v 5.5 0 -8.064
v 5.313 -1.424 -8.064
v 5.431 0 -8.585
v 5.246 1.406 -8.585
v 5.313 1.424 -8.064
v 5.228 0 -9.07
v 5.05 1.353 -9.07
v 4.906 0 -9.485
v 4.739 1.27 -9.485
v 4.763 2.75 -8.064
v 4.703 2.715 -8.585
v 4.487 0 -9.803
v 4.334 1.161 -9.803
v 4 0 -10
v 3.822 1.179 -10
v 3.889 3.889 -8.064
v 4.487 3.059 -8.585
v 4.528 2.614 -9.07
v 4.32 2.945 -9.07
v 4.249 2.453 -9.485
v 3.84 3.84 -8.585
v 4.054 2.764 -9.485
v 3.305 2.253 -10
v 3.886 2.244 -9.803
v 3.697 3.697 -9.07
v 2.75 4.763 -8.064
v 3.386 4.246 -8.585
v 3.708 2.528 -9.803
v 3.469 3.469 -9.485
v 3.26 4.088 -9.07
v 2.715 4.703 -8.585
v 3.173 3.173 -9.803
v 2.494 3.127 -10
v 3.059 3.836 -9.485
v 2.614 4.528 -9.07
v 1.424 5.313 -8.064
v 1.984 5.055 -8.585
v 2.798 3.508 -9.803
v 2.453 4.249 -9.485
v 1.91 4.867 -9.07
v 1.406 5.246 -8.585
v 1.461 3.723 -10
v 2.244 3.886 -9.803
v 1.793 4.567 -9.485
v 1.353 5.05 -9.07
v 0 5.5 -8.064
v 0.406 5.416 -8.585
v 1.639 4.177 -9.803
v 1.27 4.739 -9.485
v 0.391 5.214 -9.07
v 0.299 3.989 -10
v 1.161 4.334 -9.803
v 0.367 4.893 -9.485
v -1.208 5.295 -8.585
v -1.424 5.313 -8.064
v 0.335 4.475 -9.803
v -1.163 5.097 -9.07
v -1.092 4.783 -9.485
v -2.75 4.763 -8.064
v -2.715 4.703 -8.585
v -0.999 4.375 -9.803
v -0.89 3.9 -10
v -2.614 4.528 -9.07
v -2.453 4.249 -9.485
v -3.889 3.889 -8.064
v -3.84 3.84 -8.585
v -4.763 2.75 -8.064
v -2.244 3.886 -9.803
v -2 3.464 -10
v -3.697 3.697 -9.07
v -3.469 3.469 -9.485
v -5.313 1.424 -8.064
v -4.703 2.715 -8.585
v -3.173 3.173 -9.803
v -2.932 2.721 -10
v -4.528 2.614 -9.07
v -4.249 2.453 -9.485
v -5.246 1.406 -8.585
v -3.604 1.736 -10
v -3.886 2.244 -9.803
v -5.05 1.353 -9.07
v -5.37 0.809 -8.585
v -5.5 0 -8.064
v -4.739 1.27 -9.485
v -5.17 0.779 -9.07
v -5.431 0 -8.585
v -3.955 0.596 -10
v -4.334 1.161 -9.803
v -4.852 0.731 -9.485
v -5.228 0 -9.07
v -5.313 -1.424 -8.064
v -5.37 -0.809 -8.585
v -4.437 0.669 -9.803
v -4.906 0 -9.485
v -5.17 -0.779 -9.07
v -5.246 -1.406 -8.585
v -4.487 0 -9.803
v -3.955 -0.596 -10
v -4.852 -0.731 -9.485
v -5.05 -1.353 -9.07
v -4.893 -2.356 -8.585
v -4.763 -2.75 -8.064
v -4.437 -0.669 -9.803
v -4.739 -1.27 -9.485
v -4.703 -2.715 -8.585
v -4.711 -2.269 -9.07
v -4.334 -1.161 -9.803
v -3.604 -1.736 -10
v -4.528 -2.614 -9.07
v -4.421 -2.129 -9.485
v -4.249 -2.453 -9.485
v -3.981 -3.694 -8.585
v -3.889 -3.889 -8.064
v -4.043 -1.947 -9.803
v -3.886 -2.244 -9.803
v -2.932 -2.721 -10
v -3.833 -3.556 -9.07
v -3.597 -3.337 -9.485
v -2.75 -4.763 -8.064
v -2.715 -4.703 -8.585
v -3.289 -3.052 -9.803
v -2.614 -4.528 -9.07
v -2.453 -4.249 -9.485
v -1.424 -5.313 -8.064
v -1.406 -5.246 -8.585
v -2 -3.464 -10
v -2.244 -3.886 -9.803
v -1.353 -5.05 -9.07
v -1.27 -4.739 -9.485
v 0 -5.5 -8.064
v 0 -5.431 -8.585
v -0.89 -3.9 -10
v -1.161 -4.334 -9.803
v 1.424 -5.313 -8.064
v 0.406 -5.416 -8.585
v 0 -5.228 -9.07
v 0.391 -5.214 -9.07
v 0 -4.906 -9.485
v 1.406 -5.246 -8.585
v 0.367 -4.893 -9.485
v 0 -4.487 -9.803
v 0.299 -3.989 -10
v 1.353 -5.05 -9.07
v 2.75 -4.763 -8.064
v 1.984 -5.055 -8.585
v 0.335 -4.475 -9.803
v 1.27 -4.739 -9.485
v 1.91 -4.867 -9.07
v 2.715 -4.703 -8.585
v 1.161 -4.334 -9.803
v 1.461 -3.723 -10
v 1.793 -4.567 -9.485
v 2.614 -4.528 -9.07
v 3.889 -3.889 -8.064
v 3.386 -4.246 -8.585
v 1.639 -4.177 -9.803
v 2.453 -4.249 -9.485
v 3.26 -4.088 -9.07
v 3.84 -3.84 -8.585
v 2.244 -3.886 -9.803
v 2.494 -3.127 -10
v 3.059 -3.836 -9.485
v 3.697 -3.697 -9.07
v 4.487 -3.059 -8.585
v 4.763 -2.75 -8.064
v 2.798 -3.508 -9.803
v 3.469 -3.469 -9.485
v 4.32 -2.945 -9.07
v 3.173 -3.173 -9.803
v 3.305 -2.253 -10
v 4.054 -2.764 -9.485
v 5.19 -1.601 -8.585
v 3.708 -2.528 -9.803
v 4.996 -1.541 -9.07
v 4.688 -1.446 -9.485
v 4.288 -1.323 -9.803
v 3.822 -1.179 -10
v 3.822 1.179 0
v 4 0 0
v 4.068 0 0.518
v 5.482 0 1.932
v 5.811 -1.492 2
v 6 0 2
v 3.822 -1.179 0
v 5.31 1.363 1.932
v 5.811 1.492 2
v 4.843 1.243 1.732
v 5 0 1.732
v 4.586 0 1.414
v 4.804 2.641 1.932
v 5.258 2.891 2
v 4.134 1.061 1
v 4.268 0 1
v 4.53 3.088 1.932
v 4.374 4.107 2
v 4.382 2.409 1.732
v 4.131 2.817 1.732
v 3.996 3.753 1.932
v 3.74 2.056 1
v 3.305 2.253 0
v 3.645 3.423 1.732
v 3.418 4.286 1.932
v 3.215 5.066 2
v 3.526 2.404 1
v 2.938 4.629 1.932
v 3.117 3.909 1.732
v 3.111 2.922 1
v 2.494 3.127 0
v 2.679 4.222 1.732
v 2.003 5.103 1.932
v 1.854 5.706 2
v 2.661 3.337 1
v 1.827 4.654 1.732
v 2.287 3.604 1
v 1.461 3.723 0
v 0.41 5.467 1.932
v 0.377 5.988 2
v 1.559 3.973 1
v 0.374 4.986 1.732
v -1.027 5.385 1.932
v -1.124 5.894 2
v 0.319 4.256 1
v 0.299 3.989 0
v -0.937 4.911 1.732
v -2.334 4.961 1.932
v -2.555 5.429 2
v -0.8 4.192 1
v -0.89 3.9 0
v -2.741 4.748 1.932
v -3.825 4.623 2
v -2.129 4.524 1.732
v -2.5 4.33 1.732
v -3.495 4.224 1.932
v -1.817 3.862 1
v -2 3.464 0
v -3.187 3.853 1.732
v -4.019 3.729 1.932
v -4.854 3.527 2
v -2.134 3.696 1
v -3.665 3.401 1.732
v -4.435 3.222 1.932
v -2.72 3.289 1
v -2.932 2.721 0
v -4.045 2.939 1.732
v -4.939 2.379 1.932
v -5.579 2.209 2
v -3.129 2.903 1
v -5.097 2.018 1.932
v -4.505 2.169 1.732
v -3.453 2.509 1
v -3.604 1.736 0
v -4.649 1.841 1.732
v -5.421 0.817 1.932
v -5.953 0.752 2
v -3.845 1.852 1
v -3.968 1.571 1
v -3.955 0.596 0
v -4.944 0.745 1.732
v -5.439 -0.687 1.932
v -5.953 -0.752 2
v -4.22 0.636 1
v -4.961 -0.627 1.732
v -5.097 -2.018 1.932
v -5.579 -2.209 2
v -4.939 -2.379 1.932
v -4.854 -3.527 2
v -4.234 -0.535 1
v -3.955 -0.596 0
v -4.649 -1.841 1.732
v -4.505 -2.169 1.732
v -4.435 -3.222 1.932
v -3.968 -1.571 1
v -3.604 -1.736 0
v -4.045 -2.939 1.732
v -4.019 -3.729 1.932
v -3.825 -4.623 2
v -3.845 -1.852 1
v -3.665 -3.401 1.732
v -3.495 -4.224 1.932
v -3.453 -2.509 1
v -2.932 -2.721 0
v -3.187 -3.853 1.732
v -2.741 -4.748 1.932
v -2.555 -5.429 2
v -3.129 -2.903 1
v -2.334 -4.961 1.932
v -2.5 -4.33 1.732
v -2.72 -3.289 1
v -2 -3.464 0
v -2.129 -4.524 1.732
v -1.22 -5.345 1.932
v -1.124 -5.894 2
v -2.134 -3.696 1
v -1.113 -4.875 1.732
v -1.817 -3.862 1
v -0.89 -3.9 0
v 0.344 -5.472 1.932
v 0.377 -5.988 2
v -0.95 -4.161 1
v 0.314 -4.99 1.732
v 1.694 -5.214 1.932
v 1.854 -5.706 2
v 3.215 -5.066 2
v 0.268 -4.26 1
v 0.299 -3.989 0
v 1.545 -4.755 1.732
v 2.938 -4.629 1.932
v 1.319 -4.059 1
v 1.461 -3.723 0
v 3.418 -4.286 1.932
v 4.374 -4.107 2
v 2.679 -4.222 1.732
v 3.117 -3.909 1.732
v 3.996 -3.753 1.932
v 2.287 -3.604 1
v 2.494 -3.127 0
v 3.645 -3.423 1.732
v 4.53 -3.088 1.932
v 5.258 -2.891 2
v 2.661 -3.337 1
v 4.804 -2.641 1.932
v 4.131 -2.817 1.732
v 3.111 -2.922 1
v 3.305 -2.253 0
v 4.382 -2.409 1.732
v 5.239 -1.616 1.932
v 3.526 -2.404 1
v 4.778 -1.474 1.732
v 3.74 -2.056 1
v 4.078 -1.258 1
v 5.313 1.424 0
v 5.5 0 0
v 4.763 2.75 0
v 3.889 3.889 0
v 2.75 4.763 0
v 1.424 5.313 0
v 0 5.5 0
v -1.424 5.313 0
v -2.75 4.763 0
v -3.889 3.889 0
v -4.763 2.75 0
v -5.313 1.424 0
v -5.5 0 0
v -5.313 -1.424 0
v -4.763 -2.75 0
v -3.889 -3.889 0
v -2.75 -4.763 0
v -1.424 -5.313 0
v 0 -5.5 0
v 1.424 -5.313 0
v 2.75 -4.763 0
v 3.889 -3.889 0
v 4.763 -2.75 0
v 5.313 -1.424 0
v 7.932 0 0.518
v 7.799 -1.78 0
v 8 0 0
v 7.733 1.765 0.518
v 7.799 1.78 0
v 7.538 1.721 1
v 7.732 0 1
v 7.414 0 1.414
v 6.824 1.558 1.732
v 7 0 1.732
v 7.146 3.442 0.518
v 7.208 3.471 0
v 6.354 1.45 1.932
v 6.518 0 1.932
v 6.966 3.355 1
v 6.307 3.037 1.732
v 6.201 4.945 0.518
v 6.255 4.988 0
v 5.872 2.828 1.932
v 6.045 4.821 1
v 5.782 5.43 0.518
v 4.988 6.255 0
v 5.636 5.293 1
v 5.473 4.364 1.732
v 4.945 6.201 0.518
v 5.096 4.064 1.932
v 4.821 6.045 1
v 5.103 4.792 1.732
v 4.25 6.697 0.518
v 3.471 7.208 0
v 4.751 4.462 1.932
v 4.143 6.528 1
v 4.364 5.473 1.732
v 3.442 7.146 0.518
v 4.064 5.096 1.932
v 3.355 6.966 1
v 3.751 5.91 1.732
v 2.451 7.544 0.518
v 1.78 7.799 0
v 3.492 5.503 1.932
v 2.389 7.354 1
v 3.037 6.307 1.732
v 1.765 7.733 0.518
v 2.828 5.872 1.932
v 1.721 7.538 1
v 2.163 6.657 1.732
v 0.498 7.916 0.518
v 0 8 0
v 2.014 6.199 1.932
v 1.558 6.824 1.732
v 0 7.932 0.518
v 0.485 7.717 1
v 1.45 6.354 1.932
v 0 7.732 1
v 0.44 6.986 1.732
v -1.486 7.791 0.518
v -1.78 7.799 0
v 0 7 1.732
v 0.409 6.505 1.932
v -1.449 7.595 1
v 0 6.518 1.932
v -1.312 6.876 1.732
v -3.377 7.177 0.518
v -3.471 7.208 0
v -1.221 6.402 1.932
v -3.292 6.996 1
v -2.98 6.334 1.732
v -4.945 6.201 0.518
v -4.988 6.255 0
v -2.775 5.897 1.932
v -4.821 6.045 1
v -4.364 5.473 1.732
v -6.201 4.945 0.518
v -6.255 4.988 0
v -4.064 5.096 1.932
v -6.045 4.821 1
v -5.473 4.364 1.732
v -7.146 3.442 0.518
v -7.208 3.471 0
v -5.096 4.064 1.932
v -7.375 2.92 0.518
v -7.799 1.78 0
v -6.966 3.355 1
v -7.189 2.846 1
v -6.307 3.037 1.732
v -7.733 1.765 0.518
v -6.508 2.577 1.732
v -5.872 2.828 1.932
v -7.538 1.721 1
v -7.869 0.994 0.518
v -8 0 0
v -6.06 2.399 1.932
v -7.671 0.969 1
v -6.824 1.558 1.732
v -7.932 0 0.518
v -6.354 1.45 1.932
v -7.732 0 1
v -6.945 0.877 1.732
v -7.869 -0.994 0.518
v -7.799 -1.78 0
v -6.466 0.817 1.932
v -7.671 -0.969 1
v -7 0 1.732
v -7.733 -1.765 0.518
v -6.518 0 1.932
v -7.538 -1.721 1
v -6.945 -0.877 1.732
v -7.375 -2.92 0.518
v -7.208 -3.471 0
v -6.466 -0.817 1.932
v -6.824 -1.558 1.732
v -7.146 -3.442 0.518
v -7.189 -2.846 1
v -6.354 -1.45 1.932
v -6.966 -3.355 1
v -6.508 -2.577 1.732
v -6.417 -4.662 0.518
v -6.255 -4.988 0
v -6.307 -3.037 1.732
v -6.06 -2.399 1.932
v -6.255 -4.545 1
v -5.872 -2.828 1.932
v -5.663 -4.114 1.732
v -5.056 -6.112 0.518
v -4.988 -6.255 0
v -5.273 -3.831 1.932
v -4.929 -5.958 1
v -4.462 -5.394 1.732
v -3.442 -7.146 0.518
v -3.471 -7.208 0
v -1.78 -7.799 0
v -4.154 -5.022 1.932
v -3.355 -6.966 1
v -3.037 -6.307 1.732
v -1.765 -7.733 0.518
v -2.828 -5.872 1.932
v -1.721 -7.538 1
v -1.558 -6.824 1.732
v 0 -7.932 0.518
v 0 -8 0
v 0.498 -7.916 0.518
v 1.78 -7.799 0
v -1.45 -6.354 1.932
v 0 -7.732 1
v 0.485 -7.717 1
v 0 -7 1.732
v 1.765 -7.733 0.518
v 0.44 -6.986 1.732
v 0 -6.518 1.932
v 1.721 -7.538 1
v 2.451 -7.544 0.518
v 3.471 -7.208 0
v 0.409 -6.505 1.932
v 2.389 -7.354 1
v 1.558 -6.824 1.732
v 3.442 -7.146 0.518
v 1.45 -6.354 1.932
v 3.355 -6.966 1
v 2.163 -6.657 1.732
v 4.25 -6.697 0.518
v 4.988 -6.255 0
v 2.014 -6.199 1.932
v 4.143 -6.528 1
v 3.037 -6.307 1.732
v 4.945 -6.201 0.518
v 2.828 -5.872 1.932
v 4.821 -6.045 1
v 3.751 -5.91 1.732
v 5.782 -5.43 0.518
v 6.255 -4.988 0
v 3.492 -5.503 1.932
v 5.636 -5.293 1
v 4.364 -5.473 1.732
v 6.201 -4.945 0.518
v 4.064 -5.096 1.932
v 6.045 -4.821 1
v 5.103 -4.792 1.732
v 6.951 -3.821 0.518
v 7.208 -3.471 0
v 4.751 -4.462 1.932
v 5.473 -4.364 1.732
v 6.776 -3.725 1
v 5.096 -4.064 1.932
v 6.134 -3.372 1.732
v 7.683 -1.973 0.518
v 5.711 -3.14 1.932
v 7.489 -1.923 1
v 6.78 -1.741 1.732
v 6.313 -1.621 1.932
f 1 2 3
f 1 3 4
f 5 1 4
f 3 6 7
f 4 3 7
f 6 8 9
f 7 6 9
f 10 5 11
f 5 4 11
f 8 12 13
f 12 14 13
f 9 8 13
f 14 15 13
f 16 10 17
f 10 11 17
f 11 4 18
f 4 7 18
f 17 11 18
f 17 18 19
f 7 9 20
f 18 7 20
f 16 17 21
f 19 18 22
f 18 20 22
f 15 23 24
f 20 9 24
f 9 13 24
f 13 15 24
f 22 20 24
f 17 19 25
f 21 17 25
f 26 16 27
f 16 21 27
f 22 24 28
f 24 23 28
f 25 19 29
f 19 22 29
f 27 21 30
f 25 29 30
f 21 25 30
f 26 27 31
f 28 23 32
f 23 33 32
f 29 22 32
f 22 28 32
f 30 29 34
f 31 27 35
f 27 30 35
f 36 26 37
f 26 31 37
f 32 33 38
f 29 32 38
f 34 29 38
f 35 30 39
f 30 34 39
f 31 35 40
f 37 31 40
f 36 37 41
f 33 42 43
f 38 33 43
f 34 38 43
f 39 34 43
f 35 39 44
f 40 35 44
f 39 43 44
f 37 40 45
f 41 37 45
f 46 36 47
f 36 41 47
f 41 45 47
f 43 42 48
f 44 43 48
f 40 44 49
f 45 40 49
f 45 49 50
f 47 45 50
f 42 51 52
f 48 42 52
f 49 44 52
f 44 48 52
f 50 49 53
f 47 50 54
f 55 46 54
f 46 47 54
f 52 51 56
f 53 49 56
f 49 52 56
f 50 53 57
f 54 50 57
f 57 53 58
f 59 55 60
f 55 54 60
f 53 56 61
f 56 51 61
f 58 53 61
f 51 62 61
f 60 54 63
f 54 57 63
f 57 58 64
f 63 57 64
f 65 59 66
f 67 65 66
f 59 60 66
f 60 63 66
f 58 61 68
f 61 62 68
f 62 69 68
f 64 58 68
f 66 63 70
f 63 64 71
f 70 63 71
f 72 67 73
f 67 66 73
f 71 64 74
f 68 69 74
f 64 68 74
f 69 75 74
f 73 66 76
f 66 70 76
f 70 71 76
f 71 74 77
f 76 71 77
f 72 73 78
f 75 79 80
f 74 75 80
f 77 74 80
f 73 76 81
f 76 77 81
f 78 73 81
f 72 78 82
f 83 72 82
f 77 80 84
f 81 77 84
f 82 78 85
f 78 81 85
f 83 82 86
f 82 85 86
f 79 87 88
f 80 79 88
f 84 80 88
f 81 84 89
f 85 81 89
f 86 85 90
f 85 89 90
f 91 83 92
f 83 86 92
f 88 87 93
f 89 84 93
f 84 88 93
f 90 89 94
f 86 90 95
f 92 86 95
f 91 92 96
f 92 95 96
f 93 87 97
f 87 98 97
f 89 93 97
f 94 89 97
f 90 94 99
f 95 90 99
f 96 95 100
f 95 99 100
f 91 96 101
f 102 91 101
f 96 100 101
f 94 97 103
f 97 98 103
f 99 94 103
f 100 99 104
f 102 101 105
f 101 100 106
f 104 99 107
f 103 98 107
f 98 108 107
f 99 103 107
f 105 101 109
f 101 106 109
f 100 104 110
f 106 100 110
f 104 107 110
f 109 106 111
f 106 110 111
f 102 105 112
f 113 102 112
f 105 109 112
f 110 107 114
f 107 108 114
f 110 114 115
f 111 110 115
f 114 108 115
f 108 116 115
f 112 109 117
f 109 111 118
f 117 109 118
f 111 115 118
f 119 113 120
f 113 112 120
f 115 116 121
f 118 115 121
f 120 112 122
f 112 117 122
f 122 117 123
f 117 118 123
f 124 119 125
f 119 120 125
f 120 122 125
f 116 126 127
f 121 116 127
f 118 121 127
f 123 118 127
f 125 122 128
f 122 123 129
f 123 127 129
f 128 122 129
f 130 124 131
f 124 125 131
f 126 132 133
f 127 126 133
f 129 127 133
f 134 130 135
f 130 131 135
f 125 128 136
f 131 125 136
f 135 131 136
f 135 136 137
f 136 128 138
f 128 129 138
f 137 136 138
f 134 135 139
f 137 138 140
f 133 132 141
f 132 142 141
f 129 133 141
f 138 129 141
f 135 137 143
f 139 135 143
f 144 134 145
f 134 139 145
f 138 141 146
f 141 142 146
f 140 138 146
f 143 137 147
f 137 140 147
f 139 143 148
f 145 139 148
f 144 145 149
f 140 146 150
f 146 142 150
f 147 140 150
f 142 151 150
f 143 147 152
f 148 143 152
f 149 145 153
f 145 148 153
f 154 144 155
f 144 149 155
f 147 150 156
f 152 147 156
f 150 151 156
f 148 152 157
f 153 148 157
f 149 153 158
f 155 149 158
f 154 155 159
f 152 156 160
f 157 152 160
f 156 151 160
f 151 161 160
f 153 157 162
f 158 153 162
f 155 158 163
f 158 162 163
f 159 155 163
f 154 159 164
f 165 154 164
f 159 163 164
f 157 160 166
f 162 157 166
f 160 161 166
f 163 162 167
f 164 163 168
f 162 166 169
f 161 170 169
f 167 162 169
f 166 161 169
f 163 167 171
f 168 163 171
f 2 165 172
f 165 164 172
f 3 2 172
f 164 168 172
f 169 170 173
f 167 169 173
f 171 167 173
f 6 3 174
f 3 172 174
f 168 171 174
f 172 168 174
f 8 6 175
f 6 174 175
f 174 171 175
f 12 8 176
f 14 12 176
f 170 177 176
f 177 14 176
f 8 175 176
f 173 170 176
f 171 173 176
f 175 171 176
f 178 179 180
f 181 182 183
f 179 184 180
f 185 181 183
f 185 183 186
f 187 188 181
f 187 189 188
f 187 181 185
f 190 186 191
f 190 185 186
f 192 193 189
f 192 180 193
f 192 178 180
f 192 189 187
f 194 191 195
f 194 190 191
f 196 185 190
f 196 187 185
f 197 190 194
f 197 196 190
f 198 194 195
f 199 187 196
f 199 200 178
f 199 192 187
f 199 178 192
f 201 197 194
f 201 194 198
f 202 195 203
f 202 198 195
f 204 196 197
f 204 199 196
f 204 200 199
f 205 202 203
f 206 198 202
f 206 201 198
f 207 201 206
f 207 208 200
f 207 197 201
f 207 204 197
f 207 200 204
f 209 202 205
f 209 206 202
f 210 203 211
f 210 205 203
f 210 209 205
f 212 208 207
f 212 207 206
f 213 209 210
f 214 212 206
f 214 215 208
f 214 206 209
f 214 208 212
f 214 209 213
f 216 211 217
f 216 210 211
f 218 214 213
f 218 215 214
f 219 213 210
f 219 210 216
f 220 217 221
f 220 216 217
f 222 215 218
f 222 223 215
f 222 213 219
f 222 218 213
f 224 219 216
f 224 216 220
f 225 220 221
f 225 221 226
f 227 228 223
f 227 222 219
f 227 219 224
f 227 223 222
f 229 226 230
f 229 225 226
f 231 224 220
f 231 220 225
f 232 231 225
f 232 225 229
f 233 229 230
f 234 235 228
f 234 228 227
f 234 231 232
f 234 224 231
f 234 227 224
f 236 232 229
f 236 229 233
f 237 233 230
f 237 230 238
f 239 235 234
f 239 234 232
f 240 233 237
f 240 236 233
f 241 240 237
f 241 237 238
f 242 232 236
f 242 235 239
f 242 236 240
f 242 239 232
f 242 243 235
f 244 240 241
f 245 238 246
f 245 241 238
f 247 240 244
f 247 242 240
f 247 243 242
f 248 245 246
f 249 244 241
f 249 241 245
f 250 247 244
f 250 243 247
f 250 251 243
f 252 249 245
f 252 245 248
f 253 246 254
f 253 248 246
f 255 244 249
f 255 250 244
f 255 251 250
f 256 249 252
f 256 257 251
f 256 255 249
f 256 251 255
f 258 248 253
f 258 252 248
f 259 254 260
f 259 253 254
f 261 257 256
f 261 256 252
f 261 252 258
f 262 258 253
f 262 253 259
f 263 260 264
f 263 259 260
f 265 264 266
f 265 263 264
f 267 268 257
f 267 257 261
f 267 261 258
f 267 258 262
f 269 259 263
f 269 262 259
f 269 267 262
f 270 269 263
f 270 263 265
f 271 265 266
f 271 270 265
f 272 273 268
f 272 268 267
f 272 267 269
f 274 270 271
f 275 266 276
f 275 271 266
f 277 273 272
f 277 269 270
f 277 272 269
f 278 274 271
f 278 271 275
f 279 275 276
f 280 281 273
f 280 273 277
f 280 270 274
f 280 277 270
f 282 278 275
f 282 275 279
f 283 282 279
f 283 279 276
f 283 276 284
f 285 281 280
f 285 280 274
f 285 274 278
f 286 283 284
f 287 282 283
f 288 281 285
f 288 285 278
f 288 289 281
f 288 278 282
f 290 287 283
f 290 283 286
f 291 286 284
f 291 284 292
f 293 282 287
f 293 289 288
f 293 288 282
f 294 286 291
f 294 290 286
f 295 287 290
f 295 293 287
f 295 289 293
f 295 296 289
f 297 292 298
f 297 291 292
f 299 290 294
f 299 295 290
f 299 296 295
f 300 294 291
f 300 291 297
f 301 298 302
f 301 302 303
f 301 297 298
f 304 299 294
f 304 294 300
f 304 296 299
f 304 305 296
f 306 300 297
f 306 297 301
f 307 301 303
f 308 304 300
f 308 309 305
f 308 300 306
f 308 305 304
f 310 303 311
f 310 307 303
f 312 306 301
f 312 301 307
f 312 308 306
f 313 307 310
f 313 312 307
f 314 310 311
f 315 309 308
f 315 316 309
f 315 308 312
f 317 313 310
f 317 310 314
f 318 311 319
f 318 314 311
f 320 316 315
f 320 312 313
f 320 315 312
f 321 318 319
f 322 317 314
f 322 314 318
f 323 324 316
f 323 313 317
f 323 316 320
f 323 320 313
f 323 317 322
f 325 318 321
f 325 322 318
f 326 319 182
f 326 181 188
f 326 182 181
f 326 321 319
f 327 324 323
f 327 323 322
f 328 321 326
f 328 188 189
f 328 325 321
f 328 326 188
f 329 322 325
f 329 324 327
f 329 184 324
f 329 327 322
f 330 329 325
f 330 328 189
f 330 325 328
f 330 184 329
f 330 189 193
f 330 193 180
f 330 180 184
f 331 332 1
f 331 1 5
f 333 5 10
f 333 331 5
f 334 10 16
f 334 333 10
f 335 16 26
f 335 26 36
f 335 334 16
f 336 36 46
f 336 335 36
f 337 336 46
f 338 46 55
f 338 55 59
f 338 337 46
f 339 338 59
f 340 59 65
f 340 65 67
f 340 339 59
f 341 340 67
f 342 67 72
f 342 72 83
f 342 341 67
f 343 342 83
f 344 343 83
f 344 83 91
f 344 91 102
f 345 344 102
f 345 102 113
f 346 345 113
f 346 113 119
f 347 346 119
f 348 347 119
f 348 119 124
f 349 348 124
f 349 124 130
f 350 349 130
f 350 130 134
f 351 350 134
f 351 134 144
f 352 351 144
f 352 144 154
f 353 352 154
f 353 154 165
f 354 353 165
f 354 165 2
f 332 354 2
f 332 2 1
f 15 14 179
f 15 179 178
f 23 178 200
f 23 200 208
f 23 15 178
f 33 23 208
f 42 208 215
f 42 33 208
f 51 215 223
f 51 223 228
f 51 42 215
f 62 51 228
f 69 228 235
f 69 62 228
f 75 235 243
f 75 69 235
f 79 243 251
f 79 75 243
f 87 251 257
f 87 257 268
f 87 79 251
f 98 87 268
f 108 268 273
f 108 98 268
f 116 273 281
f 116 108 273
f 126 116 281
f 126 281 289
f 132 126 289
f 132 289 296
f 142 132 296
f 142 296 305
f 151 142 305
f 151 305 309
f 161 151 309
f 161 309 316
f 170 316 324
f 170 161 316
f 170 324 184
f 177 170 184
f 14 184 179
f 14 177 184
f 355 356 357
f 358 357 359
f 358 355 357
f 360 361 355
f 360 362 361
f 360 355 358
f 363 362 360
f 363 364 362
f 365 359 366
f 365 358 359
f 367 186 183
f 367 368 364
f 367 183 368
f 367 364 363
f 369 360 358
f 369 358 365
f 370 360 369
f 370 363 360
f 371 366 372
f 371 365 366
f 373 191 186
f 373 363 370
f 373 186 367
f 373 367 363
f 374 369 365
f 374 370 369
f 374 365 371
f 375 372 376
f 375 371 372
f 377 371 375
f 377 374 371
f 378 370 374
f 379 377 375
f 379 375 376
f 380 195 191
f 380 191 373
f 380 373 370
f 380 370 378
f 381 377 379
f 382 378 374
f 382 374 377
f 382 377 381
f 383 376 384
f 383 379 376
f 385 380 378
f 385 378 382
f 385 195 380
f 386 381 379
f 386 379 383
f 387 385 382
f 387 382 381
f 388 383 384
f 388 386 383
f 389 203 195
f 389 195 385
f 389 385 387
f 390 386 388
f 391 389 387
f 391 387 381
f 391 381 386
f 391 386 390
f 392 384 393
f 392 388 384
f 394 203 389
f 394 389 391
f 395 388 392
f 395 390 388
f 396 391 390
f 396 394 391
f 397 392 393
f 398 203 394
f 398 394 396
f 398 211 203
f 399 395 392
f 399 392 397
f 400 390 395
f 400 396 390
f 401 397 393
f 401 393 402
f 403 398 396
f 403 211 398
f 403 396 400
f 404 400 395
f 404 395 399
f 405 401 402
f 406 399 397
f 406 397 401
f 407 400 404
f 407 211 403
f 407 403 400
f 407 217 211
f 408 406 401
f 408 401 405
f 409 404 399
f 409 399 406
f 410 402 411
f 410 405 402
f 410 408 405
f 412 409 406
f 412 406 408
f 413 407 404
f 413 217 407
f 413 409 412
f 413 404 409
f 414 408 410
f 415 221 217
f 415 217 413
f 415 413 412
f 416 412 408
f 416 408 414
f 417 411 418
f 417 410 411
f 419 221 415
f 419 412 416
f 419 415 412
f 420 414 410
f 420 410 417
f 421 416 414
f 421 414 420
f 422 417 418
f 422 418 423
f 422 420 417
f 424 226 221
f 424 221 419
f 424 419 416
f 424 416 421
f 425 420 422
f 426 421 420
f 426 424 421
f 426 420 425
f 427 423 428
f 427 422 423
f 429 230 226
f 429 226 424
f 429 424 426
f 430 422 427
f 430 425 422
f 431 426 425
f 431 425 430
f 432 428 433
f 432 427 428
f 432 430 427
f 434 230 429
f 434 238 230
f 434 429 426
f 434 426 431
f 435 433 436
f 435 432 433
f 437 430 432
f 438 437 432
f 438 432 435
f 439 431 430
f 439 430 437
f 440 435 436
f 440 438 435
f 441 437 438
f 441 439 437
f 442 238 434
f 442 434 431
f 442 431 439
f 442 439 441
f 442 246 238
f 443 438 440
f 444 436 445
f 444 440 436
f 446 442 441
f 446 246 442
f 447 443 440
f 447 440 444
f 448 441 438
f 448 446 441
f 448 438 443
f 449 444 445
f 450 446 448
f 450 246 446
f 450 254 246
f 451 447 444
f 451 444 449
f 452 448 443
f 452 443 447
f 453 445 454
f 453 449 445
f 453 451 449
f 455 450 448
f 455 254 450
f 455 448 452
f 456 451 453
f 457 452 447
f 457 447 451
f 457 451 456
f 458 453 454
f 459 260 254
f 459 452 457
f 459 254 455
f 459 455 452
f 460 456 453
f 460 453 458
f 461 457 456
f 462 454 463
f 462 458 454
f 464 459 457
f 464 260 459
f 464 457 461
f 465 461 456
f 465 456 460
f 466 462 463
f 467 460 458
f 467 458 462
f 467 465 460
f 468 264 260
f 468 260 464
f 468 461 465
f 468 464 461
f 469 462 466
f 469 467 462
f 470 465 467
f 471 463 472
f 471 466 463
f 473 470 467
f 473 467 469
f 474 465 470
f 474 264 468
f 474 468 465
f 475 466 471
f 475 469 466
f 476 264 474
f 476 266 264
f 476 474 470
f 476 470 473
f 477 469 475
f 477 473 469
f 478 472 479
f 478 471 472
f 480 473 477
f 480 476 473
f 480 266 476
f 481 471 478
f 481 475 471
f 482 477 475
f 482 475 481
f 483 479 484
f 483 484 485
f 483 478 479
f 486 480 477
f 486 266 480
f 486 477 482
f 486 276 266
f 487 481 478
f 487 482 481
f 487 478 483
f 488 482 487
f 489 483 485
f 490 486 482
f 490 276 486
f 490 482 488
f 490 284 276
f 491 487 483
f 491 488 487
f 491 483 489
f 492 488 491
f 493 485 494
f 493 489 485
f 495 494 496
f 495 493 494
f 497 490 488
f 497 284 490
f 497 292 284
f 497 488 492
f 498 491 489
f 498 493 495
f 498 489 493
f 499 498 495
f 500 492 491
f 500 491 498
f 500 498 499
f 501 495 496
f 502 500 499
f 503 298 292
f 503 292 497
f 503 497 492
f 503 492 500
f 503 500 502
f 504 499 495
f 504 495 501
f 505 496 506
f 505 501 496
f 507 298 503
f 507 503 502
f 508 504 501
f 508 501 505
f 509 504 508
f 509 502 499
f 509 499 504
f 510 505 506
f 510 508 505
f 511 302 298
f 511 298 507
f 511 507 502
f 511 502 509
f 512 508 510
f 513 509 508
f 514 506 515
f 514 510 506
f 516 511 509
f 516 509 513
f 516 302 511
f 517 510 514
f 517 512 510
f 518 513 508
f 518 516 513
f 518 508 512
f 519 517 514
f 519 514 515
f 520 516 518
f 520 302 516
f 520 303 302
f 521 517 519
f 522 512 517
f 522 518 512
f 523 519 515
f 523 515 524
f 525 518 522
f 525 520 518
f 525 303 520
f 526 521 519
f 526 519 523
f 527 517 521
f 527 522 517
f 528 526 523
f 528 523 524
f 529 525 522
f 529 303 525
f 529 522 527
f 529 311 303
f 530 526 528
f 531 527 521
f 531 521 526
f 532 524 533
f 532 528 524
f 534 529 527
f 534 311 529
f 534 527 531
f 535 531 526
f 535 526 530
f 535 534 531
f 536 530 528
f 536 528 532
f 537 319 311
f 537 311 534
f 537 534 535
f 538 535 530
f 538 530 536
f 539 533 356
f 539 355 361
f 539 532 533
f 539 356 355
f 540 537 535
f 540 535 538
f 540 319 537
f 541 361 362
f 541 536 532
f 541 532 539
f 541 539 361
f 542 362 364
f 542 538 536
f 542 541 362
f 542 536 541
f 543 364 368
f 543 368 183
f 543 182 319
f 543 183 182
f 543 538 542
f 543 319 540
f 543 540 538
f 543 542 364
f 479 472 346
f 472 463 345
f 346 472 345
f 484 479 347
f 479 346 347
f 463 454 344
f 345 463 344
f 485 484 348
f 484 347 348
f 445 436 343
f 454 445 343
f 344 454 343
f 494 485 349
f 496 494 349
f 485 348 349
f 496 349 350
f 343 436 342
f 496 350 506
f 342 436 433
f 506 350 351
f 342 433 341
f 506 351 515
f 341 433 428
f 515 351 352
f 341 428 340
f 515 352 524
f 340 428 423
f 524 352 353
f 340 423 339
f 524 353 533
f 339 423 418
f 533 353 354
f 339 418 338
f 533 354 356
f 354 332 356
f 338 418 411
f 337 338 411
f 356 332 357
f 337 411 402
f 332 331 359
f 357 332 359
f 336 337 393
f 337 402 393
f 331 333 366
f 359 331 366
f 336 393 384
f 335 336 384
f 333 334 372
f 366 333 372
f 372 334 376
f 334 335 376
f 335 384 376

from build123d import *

# Parameters (mm, degrees)
F0_R     = 5.5
F0_R_2   = 4
F1_DEPTH = 10
F0_R_3   = 8
F2_DEPTH = 2


# Not quite as in the source:
# - a fillet or chamfer that OpenCascade refuses, or shapes differently, is made with other operations: its cross-section is extruded or revolved along the edge and cut away or added


with BuildPart() as f1:
    # F0 (on Top) → F1 (new body)
    with BuildSketch(Plane.XY):
        Circle(F0_R)
        Circle(F0_R_2, mode=Mode.SUBTRACT)
    extrude(amount=-F1_DEPTH)

    # F0 (on Top) → F2 (join)
    with BuildSketch(Plane.XY):
        Circle(F0_R_3)
        Circle(F0_R, mode=Mode.SUBTRACT)
        Circle(F0_R)
        Circle(F0_R_2, mode=Mode.SUBTRACT)
    extrude(amount=F2_DEPTH)

    # F3: fillet of radius 2 on 3 edges, made by hand

    # F3_s1 → F3_t2 (revolve, cut)
    with BuildSketch(Plane.XZ):
        with BuildLine():
            ThreePointArc((8, 0), (7.4142135624, 1.4142135624), (6, 2))
            Line((6, 2), (8, 2))
            Line((8, 2), (8, 0))
        make_face()
    revolve(axis=Axis((0, 0, 2), (0, 0, 1)), mode=Mode.SUBTRACT)

    # F3_s3 → F3_t4 (revolve, cut)
    with BuildSketch(Plane.XZ):
        with BuildLine():
            ThreePointArc((6, 2), (4.5857864376, 1.4142135624), (4, 0))
            Line((4, 0), (4, 2))
            Line((4, 2), (6, 2))
        make_face()
    revolve(axis=Axis((0, 0, 2), (0, 0, 1)), mode=Mode.SUBTRACT)

    # F3_s5 → F3_t6 (revolve, cut)
    with BuildSketch(Plane.XZ):
        with BuildLine():
            ThreePointArc((5.5, -8.0635083269), (5.0811388301, -9.2882531983), (4, -10))
            Line((4, -10), (5.5, -10))
            Line((5.5, -10), (5.5, -8.0635083269))
        make_face()
    revolve(axis=Axis((0, 0, -10), (0, 0, 1)), mode=Mode.SUBTRACT)


solid = f1.part
